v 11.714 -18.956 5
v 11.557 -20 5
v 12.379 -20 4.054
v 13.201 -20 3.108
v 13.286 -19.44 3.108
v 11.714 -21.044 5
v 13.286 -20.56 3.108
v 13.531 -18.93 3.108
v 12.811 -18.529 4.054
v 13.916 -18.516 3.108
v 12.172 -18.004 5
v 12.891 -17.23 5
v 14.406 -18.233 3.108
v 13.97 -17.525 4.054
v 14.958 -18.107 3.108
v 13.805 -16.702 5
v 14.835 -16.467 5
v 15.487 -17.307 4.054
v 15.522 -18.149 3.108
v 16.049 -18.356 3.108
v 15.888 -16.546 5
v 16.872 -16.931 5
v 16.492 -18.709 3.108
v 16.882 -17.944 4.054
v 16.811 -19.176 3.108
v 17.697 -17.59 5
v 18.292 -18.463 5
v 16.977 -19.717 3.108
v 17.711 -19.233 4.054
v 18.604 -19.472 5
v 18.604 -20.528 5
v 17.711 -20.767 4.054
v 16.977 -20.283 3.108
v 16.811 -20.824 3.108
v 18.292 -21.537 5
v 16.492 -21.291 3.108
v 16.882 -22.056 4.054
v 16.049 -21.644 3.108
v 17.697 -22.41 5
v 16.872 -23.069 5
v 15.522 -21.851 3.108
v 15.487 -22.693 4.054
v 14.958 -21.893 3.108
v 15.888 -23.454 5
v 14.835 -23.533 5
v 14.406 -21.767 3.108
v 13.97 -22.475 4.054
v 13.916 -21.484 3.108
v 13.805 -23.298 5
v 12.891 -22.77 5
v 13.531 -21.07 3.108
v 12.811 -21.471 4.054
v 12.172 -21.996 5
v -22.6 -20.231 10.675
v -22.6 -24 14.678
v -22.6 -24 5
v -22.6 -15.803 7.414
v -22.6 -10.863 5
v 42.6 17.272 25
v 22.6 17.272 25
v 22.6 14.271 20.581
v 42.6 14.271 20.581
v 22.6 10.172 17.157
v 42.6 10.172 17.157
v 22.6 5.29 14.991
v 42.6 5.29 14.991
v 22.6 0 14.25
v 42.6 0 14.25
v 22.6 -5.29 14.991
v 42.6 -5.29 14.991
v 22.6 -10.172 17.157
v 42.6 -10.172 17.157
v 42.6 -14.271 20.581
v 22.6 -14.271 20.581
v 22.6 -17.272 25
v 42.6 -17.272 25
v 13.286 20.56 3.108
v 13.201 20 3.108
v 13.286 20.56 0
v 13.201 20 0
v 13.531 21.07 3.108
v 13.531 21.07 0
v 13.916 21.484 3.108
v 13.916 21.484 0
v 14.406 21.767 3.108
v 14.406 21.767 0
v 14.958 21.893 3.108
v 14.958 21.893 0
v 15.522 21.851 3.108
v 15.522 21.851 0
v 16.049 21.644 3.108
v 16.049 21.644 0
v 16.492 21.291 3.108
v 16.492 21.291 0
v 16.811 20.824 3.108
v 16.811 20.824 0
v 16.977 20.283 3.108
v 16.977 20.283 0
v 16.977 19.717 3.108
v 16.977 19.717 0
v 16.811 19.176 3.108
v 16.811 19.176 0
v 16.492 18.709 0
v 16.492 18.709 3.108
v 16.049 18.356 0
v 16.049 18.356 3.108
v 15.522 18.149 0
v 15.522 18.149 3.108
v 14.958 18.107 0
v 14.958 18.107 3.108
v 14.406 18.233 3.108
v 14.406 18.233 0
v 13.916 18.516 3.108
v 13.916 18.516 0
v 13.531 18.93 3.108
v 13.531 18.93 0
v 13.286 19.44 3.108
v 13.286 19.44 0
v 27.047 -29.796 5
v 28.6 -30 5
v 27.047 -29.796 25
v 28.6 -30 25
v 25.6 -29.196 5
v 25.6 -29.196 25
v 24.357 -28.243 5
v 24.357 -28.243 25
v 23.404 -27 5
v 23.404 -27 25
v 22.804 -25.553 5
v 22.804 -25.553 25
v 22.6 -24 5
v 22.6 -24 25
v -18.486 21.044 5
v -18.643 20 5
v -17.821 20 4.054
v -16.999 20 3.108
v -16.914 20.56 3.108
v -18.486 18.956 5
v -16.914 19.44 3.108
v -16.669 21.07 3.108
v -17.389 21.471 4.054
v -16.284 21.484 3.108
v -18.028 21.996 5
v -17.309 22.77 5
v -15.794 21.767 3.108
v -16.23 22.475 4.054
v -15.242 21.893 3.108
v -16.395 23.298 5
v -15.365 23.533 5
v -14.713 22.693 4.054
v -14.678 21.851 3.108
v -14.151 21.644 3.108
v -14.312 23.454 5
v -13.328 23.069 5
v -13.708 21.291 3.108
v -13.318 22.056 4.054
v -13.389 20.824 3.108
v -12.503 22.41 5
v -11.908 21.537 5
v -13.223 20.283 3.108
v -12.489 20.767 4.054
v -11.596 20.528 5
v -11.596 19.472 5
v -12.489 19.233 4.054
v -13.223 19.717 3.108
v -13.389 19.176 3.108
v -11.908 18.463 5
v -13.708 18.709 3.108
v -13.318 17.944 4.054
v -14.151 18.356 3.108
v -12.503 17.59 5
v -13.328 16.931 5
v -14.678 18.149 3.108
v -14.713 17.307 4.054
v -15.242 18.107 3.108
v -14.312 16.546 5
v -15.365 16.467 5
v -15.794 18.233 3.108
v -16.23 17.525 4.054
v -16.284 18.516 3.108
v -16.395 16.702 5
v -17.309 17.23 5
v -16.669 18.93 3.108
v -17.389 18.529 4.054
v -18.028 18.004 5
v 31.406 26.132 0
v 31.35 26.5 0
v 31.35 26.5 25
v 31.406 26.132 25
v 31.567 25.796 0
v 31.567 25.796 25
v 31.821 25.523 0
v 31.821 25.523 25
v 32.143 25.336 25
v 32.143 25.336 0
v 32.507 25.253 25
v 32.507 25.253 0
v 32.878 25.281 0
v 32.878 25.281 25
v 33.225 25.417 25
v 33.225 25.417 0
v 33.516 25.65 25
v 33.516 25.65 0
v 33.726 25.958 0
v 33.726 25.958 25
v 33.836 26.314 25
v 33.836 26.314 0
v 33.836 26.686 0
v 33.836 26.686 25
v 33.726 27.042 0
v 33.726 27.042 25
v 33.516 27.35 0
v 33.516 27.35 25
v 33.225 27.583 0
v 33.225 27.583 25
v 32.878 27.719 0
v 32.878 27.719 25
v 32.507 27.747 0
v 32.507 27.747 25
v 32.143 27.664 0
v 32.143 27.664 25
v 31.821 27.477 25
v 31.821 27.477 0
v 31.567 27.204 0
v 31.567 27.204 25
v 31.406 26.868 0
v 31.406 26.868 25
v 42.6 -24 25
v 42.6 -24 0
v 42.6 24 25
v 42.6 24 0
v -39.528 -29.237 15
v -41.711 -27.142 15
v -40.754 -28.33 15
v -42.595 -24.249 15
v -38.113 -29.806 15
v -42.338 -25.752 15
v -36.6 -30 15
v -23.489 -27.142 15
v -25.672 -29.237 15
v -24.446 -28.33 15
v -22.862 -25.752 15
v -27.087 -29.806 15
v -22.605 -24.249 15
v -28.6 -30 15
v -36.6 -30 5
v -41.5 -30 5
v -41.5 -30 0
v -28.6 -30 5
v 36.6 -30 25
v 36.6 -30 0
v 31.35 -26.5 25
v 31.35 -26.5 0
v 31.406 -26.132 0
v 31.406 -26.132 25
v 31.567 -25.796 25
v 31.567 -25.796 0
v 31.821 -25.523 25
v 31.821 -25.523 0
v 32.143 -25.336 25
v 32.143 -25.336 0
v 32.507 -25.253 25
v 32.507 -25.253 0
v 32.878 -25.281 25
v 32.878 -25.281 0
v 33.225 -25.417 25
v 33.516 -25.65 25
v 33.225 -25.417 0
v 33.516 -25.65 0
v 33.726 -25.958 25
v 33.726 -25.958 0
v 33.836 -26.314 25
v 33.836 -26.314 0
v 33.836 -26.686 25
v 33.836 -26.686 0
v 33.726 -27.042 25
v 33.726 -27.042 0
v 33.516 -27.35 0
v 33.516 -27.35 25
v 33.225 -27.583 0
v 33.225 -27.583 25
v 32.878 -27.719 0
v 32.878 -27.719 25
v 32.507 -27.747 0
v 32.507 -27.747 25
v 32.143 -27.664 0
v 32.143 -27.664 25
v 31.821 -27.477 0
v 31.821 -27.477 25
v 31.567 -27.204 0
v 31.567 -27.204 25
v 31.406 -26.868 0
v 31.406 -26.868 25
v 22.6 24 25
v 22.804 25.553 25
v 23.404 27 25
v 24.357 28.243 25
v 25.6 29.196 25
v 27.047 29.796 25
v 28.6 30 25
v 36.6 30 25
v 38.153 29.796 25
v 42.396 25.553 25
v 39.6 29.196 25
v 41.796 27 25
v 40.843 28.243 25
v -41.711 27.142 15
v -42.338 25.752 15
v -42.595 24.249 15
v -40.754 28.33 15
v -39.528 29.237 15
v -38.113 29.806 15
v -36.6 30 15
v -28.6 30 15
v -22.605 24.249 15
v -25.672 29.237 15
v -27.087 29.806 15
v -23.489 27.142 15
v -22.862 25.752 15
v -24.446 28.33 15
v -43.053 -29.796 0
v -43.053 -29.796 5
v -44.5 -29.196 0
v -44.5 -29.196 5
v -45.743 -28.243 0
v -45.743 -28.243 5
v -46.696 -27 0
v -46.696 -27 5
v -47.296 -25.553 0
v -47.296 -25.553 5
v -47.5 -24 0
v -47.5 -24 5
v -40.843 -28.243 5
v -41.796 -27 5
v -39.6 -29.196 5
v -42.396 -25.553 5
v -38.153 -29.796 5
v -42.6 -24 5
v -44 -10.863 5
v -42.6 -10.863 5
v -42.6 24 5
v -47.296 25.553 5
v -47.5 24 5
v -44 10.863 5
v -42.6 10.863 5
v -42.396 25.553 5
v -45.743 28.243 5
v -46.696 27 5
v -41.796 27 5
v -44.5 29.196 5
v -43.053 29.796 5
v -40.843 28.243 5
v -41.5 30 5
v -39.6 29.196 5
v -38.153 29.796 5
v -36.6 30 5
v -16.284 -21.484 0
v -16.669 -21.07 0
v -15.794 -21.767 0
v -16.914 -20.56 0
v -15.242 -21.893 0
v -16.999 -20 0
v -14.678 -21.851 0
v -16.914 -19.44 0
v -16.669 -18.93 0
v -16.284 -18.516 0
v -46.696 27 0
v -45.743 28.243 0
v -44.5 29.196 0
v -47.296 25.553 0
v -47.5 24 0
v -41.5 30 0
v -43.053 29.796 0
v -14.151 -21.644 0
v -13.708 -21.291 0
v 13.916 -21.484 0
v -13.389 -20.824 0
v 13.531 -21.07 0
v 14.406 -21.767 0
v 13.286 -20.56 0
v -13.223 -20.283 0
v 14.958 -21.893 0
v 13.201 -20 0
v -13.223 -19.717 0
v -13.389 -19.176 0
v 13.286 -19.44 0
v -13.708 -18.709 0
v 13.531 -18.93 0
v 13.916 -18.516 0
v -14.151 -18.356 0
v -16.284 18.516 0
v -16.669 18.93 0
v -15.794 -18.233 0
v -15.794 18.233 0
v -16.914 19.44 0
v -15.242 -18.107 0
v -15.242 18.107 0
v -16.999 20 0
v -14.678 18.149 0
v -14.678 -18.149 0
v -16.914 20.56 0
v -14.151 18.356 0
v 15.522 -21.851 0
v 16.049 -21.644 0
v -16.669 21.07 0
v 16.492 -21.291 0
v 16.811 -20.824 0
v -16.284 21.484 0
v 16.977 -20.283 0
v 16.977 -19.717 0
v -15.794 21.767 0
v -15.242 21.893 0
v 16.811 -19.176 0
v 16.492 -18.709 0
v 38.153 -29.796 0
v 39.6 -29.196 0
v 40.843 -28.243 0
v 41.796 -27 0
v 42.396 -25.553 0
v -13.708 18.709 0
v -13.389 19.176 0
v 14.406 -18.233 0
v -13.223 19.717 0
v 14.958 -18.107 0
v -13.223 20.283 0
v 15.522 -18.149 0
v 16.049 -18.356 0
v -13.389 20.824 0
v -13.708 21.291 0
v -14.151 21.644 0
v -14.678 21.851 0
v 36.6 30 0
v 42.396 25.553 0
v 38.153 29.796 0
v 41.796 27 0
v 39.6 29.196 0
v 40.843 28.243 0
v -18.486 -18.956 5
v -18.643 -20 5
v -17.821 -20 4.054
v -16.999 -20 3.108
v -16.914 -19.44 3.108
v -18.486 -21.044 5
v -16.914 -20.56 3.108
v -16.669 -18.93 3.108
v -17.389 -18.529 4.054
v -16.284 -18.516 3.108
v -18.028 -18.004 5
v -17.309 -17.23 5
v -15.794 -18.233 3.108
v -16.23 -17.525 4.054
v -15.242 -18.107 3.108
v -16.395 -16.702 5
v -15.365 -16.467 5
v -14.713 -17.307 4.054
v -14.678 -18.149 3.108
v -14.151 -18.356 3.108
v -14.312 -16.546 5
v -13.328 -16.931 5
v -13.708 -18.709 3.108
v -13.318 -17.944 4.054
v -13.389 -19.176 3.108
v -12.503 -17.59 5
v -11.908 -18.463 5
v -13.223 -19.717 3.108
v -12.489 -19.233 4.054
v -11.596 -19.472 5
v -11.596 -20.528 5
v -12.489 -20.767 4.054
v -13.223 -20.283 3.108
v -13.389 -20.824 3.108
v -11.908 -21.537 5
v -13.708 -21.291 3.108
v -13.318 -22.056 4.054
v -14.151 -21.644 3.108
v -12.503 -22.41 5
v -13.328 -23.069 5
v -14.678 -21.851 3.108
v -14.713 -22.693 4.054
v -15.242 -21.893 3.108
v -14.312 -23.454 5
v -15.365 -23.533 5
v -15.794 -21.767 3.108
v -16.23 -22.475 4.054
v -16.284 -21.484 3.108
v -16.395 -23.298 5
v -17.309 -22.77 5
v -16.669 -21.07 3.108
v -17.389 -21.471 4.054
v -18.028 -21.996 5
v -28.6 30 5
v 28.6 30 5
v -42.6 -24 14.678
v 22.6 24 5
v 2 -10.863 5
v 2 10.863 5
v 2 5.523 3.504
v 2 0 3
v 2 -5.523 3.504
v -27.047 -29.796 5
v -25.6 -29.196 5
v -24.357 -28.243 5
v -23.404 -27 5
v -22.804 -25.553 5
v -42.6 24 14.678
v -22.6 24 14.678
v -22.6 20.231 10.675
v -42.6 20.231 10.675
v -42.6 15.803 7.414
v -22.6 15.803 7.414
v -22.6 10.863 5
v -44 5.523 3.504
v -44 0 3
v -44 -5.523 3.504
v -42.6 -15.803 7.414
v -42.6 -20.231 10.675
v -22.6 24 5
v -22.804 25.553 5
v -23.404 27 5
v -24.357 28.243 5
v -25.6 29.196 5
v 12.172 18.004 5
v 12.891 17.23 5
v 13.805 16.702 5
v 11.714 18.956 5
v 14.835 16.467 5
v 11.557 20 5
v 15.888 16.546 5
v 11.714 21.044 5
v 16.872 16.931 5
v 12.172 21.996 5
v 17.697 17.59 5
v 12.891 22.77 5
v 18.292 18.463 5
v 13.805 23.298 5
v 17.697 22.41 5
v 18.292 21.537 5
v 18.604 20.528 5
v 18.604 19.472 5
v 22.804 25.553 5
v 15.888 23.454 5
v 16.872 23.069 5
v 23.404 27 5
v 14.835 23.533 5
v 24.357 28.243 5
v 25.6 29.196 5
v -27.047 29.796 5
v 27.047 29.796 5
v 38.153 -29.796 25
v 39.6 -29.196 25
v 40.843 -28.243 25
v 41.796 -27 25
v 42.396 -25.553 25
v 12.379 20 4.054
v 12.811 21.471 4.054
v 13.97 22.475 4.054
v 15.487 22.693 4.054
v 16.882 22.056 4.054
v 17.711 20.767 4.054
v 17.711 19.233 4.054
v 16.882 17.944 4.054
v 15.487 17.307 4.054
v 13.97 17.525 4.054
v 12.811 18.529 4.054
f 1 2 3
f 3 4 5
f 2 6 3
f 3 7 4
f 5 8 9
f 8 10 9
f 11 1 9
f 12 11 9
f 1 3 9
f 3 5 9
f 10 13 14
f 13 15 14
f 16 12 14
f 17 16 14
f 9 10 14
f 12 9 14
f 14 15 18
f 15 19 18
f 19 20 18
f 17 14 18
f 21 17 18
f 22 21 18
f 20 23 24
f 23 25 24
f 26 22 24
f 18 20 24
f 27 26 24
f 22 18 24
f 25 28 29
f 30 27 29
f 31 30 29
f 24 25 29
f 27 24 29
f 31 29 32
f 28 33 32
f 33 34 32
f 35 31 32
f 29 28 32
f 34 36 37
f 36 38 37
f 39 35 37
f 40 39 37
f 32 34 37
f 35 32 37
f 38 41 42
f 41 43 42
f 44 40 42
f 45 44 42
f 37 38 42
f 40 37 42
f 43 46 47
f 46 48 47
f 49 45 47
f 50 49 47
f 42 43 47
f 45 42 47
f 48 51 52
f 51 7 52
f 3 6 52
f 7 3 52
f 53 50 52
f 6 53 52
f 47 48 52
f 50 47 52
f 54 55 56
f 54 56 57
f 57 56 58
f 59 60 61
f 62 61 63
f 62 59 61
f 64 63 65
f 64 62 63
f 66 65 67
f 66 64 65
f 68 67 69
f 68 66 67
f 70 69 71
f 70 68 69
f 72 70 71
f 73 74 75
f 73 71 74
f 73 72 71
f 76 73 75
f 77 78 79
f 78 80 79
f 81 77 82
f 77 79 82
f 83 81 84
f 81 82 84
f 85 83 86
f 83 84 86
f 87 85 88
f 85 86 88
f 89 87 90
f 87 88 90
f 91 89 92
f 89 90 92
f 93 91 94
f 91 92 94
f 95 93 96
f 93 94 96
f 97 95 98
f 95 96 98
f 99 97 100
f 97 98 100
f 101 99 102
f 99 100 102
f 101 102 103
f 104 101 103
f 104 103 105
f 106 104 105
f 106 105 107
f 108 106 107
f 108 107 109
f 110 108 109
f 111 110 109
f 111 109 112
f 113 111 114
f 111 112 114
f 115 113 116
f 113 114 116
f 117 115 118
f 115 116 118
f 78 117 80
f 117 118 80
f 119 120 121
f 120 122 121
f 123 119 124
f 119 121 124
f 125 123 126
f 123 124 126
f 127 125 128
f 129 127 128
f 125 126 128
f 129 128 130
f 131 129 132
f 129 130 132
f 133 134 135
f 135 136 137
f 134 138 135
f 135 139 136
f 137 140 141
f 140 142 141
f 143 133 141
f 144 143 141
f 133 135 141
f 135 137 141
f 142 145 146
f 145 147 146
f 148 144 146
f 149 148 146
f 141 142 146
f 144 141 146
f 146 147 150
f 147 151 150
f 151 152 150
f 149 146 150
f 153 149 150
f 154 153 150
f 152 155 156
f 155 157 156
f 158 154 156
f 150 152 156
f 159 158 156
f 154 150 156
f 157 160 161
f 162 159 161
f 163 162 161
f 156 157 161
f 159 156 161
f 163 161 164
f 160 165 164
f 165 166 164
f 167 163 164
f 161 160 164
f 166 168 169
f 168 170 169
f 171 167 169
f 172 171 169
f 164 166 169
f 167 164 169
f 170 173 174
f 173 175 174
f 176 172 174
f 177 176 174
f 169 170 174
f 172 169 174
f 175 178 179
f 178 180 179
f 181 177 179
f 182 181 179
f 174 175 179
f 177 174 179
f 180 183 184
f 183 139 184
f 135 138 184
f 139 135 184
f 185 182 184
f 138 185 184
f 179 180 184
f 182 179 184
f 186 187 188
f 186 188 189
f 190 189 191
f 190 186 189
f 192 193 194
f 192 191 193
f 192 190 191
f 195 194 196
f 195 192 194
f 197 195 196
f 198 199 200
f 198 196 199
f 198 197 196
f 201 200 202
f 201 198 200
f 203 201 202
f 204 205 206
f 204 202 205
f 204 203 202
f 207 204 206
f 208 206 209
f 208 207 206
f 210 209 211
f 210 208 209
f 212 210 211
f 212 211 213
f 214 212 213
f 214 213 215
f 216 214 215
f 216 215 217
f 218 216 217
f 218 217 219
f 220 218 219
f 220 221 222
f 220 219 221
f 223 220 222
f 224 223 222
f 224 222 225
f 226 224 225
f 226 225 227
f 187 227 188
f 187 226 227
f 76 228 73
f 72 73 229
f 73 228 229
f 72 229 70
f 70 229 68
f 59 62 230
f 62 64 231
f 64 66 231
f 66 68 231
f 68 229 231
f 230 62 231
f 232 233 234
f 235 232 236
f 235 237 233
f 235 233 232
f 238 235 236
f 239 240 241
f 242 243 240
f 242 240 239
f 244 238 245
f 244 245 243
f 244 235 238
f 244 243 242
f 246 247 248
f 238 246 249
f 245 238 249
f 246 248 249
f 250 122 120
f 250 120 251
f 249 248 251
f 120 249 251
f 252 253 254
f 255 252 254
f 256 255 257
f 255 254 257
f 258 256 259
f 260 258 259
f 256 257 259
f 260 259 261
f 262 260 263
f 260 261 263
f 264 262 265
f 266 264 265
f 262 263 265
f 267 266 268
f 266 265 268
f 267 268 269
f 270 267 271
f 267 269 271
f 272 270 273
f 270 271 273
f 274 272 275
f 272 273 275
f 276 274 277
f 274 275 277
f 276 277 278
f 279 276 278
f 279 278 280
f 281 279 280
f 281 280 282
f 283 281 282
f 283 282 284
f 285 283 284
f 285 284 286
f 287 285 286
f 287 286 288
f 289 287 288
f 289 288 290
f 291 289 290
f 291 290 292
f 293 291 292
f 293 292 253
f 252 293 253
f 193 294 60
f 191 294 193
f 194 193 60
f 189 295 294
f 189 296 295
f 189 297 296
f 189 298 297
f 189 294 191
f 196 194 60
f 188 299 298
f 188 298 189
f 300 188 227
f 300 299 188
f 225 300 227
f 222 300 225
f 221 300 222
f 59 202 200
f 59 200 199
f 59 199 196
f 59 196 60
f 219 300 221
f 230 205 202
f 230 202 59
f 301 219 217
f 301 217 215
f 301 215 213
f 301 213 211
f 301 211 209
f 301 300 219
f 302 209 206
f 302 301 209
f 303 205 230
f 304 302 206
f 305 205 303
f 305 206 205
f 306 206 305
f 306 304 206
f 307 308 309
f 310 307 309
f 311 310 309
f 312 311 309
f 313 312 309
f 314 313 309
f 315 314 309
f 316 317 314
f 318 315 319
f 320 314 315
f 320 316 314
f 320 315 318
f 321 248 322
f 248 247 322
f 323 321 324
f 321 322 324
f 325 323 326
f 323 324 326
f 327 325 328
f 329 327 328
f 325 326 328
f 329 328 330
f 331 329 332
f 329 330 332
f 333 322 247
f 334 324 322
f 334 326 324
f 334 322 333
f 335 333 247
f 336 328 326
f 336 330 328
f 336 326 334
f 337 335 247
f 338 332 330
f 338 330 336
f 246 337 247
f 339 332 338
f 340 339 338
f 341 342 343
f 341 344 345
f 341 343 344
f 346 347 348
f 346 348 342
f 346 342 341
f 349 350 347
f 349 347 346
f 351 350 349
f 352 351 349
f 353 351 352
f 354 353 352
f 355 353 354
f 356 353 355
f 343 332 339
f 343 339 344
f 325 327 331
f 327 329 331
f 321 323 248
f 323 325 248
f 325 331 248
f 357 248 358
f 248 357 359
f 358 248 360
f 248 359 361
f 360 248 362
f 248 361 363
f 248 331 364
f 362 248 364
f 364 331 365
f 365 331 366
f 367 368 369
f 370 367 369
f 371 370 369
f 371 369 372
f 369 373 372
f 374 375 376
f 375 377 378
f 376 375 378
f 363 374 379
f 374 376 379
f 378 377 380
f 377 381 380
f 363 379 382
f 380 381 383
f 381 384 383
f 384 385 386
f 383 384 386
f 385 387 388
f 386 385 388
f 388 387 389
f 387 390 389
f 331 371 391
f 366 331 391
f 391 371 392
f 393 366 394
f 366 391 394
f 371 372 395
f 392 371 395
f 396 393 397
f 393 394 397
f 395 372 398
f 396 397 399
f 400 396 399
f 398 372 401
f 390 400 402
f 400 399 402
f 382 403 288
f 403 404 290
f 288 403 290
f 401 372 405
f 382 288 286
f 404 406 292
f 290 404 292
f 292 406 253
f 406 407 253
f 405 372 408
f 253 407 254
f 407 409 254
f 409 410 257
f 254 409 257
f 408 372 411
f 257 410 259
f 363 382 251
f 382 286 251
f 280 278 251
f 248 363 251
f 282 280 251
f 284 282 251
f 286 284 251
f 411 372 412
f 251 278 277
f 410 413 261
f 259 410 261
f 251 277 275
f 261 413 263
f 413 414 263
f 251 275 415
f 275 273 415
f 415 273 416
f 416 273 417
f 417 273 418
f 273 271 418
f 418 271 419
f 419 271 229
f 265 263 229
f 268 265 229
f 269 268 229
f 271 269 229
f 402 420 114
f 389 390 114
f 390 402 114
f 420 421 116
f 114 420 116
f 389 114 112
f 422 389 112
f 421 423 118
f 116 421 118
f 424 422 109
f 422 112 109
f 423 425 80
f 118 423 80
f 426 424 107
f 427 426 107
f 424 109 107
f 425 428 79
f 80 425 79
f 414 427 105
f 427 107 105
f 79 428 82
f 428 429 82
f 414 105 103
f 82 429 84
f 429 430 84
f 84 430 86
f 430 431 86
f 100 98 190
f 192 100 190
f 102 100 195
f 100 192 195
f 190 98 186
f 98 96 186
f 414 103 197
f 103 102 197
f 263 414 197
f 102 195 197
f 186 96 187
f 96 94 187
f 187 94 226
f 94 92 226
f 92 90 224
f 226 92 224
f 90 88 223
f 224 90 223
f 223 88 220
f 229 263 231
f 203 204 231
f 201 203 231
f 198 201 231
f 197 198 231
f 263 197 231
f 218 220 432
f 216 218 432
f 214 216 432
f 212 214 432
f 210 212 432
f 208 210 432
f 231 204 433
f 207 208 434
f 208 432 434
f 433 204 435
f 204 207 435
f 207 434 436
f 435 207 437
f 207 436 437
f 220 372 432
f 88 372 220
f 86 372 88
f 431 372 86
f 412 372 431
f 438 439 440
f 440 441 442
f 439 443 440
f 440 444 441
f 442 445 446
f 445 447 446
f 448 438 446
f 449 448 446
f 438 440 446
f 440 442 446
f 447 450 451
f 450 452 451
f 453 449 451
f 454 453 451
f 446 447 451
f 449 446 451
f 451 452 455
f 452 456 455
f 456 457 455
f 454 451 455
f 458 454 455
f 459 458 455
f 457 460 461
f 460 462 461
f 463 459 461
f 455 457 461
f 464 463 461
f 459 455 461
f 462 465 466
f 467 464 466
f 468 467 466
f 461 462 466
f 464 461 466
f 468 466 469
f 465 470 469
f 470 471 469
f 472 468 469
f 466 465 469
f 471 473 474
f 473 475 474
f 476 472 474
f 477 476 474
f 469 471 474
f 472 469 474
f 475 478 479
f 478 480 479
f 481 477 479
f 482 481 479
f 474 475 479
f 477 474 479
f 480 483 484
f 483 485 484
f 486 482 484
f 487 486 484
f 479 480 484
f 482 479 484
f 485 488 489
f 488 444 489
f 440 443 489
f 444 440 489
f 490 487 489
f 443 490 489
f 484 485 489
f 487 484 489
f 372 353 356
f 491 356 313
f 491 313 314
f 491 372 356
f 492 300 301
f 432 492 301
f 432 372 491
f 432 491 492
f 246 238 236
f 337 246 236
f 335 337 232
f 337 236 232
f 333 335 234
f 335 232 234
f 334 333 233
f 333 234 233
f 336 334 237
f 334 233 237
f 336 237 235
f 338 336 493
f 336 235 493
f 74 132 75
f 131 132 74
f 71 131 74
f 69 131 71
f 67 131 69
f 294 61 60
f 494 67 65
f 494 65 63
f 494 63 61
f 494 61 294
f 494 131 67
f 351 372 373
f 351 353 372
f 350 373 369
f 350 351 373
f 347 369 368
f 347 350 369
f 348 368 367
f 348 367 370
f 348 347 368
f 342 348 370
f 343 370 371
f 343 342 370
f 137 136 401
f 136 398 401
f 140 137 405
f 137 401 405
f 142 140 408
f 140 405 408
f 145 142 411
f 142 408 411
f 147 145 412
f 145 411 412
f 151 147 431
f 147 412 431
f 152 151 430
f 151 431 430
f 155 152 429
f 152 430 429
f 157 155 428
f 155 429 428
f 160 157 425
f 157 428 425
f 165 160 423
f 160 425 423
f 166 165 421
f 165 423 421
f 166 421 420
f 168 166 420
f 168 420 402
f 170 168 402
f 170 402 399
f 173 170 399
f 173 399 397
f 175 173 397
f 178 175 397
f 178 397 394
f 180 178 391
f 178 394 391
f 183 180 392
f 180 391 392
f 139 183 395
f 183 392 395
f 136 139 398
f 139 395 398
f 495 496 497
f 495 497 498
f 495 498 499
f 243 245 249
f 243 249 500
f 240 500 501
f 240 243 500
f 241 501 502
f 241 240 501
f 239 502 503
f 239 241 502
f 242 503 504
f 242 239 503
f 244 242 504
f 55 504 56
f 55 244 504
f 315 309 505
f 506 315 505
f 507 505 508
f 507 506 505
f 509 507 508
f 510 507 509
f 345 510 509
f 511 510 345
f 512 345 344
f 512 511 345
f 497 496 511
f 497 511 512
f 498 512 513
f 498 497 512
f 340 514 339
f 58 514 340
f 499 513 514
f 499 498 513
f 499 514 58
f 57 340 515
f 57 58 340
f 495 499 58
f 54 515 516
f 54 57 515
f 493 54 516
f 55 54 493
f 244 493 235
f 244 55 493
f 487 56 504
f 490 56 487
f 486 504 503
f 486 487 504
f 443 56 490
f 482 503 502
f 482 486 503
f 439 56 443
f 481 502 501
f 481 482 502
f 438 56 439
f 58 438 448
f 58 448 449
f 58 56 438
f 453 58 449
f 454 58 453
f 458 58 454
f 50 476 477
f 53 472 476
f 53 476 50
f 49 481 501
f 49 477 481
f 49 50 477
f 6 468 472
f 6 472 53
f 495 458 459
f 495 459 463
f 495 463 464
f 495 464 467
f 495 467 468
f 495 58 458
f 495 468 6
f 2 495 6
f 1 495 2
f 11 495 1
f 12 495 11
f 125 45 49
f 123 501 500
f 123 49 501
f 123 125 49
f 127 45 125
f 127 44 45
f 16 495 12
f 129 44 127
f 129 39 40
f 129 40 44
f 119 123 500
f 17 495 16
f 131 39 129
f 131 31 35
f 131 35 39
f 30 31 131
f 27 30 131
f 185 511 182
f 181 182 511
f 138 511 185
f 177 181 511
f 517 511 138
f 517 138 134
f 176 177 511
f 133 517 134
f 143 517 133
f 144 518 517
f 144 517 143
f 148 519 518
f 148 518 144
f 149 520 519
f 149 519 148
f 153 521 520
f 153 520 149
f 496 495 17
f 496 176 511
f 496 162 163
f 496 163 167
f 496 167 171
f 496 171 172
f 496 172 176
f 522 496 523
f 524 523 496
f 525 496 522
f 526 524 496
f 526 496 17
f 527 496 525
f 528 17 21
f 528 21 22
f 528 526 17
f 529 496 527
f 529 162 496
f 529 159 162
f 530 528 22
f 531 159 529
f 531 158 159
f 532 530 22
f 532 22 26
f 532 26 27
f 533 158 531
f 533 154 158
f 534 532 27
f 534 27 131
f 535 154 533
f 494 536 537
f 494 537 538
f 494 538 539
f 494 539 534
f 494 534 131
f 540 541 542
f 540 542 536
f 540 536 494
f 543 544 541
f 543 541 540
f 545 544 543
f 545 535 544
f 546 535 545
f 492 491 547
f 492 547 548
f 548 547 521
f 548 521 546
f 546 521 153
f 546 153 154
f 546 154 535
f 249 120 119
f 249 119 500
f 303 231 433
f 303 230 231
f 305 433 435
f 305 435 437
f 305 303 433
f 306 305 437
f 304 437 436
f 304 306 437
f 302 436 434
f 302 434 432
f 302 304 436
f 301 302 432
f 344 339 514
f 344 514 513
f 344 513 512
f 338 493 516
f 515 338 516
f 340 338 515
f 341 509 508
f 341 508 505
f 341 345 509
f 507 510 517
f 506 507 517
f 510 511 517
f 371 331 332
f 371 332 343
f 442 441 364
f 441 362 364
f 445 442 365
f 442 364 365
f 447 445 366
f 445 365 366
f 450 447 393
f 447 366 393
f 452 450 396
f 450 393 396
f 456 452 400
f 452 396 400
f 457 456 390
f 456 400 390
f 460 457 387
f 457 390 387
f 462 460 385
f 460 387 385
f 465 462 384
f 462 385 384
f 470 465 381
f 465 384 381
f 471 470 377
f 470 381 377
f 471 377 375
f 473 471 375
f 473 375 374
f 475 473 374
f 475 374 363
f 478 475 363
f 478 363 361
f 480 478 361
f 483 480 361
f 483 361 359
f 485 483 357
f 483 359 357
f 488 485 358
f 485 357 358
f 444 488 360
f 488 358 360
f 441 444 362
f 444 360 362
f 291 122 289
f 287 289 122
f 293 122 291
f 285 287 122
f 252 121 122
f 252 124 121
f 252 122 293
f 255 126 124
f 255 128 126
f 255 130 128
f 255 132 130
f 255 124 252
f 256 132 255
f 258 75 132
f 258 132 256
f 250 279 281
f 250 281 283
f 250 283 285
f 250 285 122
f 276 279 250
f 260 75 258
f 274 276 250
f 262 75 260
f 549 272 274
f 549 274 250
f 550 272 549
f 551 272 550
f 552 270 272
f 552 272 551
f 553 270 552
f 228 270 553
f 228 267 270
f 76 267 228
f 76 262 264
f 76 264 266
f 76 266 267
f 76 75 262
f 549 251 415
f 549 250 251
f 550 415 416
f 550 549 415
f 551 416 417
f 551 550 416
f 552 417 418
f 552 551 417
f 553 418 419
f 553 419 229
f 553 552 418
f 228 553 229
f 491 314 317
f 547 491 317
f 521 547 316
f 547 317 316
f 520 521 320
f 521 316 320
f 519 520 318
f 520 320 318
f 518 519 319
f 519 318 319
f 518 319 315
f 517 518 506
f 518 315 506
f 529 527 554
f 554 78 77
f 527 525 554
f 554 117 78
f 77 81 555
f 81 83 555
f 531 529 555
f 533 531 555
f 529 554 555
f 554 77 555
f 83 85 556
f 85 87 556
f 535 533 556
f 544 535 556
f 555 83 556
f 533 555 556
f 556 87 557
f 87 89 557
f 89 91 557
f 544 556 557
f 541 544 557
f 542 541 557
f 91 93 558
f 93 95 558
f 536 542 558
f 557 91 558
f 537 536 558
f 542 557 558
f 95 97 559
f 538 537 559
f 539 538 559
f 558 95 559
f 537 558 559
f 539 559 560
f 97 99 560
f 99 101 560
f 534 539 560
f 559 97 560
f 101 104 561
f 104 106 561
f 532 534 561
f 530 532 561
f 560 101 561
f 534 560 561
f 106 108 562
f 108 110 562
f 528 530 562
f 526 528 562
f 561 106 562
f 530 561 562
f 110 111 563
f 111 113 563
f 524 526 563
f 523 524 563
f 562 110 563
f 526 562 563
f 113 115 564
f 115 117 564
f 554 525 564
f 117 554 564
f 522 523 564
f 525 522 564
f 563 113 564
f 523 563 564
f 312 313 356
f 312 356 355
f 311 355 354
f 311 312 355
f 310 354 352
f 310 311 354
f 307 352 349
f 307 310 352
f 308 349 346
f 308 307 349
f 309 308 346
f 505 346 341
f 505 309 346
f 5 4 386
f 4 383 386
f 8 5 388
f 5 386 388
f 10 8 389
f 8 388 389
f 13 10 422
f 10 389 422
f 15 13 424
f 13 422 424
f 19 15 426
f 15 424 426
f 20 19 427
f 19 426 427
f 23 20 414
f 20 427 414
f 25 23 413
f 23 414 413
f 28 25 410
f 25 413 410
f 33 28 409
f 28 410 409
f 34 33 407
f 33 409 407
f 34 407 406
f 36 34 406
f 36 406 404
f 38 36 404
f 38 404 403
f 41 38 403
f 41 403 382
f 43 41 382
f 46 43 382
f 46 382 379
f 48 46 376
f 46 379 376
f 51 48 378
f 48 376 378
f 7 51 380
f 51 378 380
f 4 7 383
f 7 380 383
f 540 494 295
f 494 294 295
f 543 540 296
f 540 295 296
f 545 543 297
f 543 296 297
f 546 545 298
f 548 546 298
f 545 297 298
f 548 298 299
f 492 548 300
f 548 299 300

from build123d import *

# Parameters (mm, degrees)
BASE_SKETCH_W                   = 90
BASE_SKETCH_H                   = 60
BASE_EXTRUDE_DEPTH              = 5
CRADLE_SKETCH_W                 = 20
CRADLE_SKETCH_H                 = 60
CRADLE_EXTRUDE_DEPTH            = 25
NO_6_MOUNTING_HOLES_D           = 3.7973
NO_6_MOUNTING_HOLES_CSINK_D     = 7.0866
NO_6_MOUNTING_HOLES_CSINK_ANGLE = 82
MOVE_START                      = 15
MOVE_FACE_OUTLINE_W             = 20
MOVE_FACE_OUTLINE_H             = 60
MOVE_FACE_DEPTH                 = 10
CLAMP_THREADED_HOLE_D           = 2.5
CRADLE_FILLETS_R                = 6
BASE_FILLETS_R                  = 6


# Read off the part's stored shape, not the designer's step: Move Face
with BuildPart() as part:
    # Base Sketch → Base Extrude (new body)
    with BuildSketch(Plane.XY):
        with Locations((-2.5, 0)):
            Rectangle(BASE_SKETCH_W, BASE_SKETCH_H)
    extrude(amount=BASE_EXTRUDE_DEPTH)

    # Cradle Sketch → Cradle Extrude (add)
    with BuildSketch(Plane.XY):
        with Locations((-32.6, 0)):
            Rectangle(CRADLE_SKETCH_W, CRADLE_SKETCH_H)
        with Locations((32.6, 0)):
            Rectangle(CRADLE_SKETCH_W, CRADLE_SKETCH_H)
    extrude(amount=CRADLE_EXTRUDE_DEPTH)

    # No. 6 Mounting Holes (through all)
    with Locations(Plane.XY.offset(5)):
        with Locations((-15.1, 20), (15.1, 20), (-15.1, -20), (15.1, -20)):
            CounterSinkHole(NO_6_MOUNTING_HOLES_D / 2, NO_6_MOUNTING_HOLES_CSINK_D / 2, counter_sink_angle=NO_6_MOUNTING_HOLES_CSINK_ANGLE)

    # Pump and Motor Revolve Cut Sketch → Pump and Motor Revolve Cut (revolve, cut)
    with BuildSketch(Plane(origin=(0, 0, 0), x_dir=(1, 0, 0), z_dir=(0, 1, 0))):
        Polygon((-44, -33.5), (-44, -3), (2, -3), (2, -14.25), (66, -14.25), (66, -33.5), align=None)
    revolve(axis=Axis((66, 0, 33.5), (-1, 0, 0)), mode=Mode.SUBTRACT)

    # Move Face outline → Move Face (cut)
    with BuildSketch(Plane.XY.offset(MOVE_START)):
        with Locations((-32.6, 0)):
            Rectangle(MOVE_FACE_OUTLINE_W, MOVE_FACE_OUTLINE_H)
    extrude(amount=MOVE_FACE_DEPTH, mode=Mode.SUBTRACT)

    # Clamp Threaded Hole (through all)
    with Locations(Plane.XY.offset(25)):
        with Locations((32.6, -26.5)):
            clamp_threaded_hole = Hole(CLAMP_THREADED_HOLE_D / 2)

    # Threaded Hole Mirror: Clamp Threaded Hole across plane
    add(clamp_threaded_hole.mirror(Plane.ZX), mode=Mode.SUBTRACT)

    # Cradle Fillets
    cradle_fillets_edges = [part.edges().sort_by_distance(p)[0] for p in [
        (-42.6, 30, 10),
        (42.6, 30, 12.5),
        (42.6, -30, 12.5),
        (-42.6, -30, 10),
        (22.6, 30, 15),
        (22.6, -30, 15),
        (-22.6, 30, 10),
        (-22.6, -30, 10),
    ]]
    fillet(cradle_fillets_edges, radius=CRADLE_FILLETS_R)

    # Base Fillets
    base_fillets_edges = [part.edges().sort_by_distance(p)[0] for p in [
        (-47.5, -30, 2.5),
        (-47.5, 30, 2.5),
    ]]
    fillet(base_fillets_edges, radius=BASE_FILLETS_R)


solid = part.part
